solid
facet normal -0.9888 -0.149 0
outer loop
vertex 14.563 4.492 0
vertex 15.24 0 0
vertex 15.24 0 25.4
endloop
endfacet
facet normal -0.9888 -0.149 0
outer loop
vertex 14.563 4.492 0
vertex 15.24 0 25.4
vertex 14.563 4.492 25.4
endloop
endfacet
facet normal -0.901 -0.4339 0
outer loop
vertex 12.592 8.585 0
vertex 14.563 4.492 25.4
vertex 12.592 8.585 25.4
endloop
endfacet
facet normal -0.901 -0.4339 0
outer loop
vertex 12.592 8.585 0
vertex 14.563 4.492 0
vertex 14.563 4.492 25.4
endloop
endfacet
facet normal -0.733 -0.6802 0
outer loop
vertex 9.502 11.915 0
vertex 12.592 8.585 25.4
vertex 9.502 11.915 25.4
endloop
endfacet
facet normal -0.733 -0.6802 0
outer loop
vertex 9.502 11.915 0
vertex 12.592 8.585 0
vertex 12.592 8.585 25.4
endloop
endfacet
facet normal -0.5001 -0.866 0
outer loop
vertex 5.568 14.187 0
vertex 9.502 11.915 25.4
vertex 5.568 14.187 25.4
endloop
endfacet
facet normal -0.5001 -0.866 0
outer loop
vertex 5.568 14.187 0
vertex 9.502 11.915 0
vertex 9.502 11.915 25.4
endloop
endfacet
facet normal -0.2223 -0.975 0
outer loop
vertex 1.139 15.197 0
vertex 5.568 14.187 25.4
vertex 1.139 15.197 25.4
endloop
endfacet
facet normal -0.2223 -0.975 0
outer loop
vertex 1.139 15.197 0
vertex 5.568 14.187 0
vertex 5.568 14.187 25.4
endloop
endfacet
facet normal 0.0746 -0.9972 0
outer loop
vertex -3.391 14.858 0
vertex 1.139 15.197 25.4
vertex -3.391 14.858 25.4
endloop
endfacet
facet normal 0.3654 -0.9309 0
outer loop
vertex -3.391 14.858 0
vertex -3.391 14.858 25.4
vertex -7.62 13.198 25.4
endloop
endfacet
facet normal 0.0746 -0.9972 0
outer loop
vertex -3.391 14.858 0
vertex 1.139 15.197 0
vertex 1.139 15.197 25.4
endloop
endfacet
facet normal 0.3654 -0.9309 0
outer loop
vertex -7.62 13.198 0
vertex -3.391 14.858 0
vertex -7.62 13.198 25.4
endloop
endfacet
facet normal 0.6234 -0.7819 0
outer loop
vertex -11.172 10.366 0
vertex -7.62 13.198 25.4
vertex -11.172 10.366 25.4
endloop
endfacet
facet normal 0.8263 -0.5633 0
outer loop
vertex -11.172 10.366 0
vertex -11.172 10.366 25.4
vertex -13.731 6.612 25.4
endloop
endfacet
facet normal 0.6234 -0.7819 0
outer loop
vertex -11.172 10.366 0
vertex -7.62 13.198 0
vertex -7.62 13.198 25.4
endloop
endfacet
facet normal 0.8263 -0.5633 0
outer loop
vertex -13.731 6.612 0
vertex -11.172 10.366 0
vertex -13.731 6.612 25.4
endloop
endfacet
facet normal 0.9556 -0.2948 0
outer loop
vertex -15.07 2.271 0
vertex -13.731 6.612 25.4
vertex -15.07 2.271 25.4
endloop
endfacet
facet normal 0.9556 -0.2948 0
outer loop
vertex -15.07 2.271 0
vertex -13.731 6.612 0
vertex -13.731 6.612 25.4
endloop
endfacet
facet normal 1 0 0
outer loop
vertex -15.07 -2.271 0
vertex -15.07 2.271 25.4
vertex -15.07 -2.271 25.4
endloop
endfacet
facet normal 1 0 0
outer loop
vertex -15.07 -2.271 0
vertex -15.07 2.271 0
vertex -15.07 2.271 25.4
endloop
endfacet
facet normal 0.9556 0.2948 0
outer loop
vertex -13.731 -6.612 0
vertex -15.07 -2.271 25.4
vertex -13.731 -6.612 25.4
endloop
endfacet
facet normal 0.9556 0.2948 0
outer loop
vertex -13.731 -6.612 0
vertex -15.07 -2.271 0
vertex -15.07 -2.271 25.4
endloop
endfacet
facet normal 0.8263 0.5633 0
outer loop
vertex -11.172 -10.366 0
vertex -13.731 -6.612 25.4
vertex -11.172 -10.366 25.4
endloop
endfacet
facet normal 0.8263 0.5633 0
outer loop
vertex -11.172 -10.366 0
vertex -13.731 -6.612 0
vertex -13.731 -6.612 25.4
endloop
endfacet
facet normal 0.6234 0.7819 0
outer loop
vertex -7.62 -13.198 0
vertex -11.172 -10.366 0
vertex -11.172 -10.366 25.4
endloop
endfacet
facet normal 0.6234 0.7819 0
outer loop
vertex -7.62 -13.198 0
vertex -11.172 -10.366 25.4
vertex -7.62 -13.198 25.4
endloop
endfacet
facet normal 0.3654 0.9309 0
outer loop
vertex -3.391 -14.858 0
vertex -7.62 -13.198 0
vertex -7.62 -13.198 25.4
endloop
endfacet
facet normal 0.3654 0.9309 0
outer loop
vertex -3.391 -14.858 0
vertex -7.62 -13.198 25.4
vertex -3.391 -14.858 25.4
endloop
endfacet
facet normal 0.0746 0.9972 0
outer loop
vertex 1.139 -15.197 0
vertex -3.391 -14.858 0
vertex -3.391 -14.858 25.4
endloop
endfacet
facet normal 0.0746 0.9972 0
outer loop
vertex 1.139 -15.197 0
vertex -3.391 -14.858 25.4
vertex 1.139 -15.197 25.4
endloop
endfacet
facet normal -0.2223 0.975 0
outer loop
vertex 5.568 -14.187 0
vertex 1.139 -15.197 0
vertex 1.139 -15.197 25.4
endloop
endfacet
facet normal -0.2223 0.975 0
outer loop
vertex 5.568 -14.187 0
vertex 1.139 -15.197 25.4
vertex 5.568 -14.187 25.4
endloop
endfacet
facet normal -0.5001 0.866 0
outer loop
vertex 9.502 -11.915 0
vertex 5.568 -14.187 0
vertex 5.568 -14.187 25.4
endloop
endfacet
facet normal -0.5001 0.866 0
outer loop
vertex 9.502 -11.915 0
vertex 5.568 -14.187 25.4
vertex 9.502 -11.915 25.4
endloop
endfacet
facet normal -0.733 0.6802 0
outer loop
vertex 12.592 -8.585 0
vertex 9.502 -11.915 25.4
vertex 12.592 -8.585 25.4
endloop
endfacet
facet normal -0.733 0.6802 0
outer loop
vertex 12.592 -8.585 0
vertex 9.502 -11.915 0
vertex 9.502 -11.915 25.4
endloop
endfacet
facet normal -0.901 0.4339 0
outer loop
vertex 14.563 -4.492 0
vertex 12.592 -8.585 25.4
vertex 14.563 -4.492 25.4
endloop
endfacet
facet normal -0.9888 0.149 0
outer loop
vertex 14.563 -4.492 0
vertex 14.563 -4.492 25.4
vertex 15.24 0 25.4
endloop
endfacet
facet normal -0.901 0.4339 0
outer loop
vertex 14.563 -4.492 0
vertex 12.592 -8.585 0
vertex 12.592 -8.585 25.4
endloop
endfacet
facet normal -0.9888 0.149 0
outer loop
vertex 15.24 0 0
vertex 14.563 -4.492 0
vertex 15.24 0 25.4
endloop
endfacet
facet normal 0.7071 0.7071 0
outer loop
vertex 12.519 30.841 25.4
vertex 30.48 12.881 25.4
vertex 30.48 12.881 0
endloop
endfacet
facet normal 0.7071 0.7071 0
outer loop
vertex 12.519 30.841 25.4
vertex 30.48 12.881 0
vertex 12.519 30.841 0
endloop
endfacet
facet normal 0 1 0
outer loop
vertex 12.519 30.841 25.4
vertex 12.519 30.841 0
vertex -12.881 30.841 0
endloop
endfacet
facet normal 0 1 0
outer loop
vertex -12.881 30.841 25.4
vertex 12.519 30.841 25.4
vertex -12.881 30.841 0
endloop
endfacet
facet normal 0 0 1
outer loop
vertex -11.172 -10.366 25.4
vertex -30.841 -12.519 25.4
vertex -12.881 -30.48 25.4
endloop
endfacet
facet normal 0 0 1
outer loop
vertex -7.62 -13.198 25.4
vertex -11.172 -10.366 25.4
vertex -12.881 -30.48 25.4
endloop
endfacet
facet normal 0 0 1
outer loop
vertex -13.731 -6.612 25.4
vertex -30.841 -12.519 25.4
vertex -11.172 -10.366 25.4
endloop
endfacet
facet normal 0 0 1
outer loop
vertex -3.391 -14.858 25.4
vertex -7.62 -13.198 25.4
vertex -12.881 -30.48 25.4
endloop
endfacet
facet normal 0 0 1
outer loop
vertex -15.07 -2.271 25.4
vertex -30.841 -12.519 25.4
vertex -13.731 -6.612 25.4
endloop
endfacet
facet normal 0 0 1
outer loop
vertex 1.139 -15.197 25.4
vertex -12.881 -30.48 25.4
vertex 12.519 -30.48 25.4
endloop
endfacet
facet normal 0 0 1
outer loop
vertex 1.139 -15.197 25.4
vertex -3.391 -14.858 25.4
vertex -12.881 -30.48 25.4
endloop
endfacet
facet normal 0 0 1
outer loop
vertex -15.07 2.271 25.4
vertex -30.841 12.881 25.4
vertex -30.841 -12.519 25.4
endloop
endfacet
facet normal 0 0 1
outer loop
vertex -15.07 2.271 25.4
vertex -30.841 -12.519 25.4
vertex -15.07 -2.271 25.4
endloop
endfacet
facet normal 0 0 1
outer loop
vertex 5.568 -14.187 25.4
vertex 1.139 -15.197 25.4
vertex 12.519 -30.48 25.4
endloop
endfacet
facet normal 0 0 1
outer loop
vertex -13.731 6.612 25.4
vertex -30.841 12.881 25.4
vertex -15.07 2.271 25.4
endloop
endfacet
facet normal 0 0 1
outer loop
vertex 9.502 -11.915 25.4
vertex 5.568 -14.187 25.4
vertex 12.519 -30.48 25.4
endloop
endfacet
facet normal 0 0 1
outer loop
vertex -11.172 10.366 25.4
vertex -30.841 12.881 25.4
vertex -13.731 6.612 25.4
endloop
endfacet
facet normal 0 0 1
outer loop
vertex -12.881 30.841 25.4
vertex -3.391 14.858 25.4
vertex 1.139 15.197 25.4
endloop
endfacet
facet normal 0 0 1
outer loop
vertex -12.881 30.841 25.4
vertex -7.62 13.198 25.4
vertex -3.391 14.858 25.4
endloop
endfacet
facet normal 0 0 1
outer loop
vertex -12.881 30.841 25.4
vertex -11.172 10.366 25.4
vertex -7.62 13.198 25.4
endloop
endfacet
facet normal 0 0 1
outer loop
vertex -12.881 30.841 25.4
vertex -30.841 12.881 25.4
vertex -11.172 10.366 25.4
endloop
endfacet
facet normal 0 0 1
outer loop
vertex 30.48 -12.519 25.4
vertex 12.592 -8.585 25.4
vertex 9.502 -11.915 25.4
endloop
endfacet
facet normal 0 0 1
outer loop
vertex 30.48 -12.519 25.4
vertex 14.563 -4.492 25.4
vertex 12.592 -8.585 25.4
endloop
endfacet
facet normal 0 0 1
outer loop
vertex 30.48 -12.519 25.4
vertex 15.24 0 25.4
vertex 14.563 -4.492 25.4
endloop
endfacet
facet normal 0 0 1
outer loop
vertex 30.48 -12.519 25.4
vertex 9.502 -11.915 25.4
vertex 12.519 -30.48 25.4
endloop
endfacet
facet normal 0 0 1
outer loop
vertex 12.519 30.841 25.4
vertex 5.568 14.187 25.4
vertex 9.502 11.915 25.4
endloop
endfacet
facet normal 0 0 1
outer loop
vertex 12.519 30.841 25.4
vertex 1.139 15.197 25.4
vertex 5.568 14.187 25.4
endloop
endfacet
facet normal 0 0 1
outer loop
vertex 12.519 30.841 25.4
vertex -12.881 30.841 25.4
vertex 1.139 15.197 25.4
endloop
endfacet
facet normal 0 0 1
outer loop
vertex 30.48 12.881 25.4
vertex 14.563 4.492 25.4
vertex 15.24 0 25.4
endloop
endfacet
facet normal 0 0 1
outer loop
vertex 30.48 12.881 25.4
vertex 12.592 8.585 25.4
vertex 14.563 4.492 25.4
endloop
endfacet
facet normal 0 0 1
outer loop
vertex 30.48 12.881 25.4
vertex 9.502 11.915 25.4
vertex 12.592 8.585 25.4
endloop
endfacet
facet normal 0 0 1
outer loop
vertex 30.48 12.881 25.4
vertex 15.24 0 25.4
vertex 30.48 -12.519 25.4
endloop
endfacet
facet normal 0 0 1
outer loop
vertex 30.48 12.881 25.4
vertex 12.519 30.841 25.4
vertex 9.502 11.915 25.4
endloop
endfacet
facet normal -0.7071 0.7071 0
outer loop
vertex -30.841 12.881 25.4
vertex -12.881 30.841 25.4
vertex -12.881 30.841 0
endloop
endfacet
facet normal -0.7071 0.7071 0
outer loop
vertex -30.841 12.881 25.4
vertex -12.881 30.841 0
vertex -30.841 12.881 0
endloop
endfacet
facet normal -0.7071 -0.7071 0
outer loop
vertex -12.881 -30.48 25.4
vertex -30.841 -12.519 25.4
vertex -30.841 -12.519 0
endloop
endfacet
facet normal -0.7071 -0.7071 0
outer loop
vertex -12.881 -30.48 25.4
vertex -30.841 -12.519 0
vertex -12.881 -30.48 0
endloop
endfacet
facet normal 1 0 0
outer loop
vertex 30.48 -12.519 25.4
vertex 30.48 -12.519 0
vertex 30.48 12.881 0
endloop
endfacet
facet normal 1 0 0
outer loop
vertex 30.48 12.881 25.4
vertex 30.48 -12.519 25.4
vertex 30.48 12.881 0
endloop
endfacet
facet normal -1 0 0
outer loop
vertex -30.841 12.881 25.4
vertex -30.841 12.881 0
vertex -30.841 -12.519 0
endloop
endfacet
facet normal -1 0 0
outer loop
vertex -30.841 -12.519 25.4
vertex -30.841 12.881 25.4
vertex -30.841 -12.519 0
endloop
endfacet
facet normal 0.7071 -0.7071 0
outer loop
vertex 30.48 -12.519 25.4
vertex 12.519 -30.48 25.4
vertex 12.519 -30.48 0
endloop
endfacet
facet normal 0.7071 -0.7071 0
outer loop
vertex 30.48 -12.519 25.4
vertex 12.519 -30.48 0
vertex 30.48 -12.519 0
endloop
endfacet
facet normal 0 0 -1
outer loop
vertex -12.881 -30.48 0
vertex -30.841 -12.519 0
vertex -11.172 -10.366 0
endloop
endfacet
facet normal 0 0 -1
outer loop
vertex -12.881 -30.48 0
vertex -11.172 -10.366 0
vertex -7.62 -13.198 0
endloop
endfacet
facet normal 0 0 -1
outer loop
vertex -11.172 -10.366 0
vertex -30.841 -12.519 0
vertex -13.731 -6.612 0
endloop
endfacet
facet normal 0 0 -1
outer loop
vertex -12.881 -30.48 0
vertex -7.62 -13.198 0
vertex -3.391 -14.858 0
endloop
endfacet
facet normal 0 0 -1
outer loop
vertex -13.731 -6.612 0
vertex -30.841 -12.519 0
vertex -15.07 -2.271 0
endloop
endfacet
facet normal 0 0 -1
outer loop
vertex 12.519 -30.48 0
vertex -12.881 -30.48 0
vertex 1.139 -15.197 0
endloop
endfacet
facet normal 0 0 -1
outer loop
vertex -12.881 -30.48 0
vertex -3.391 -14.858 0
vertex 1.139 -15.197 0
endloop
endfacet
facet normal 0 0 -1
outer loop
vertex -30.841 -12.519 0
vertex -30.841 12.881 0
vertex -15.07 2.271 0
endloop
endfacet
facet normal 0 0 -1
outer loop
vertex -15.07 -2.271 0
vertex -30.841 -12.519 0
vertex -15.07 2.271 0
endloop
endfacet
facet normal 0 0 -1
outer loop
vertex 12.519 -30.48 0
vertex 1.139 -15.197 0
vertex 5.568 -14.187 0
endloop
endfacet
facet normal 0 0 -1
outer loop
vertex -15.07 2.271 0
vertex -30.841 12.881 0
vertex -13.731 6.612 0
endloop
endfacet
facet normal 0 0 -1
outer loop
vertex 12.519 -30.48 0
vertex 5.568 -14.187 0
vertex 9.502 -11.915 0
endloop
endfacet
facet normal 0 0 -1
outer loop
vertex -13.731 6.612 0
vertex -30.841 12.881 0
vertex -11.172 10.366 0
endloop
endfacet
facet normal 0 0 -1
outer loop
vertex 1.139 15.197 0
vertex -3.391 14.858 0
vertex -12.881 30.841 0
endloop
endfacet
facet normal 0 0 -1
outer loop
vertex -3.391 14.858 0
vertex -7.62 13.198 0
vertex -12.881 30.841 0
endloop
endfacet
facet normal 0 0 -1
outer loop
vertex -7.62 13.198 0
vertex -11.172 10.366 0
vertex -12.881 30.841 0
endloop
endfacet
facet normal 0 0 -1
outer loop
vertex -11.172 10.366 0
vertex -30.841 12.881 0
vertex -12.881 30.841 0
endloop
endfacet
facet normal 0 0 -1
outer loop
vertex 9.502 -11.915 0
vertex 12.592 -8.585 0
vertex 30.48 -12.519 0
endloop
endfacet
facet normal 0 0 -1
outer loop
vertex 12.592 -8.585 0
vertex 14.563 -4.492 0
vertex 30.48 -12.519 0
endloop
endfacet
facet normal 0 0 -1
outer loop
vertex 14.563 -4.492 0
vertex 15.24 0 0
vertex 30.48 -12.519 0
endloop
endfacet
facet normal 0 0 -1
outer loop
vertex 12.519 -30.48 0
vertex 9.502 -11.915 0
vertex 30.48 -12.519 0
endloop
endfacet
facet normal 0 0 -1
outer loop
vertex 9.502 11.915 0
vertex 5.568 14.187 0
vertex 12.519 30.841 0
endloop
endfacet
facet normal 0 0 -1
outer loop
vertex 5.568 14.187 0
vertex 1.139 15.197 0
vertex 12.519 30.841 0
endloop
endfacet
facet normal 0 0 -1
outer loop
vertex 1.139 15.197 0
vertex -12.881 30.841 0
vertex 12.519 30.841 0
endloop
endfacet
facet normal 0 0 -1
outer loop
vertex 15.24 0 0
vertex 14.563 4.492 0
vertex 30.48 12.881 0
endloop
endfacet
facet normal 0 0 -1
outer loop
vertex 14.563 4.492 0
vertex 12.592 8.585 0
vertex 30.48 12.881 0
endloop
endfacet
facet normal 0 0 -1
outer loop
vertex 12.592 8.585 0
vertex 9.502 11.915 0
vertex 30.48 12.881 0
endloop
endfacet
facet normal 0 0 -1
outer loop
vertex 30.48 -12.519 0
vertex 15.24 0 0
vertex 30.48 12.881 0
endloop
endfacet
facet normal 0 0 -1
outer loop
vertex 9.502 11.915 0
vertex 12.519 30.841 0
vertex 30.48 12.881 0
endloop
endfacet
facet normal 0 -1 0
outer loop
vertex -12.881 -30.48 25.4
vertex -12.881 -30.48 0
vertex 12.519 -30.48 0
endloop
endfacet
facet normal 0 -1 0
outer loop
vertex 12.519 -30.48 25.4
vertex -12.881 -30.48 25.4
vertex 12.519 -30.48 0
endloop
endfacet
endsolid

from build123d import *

# Parameters (mm, degrees)
F0_R     = 15.24
F1_DEPTH = 25.4


with BuildPart() as f1:
    # F0 (on Top) → F1 (new body)
    with BuildSketch(Plane.XY):
        Polygon((12.519488, 30.841024), (-12.880512, 30.841024), (-30.841024, 12.880512), (-30.841024, -12.519488), (-12.880512, -30.48), (12.519488, -30.48), (30.48, -12.519488), (30.48, 12.880512), align=None)
        Circle(F0_R, mode=Mode.SUBTRACT)
    extrude(amount=F1_DEPTH)


solid = f1.part
